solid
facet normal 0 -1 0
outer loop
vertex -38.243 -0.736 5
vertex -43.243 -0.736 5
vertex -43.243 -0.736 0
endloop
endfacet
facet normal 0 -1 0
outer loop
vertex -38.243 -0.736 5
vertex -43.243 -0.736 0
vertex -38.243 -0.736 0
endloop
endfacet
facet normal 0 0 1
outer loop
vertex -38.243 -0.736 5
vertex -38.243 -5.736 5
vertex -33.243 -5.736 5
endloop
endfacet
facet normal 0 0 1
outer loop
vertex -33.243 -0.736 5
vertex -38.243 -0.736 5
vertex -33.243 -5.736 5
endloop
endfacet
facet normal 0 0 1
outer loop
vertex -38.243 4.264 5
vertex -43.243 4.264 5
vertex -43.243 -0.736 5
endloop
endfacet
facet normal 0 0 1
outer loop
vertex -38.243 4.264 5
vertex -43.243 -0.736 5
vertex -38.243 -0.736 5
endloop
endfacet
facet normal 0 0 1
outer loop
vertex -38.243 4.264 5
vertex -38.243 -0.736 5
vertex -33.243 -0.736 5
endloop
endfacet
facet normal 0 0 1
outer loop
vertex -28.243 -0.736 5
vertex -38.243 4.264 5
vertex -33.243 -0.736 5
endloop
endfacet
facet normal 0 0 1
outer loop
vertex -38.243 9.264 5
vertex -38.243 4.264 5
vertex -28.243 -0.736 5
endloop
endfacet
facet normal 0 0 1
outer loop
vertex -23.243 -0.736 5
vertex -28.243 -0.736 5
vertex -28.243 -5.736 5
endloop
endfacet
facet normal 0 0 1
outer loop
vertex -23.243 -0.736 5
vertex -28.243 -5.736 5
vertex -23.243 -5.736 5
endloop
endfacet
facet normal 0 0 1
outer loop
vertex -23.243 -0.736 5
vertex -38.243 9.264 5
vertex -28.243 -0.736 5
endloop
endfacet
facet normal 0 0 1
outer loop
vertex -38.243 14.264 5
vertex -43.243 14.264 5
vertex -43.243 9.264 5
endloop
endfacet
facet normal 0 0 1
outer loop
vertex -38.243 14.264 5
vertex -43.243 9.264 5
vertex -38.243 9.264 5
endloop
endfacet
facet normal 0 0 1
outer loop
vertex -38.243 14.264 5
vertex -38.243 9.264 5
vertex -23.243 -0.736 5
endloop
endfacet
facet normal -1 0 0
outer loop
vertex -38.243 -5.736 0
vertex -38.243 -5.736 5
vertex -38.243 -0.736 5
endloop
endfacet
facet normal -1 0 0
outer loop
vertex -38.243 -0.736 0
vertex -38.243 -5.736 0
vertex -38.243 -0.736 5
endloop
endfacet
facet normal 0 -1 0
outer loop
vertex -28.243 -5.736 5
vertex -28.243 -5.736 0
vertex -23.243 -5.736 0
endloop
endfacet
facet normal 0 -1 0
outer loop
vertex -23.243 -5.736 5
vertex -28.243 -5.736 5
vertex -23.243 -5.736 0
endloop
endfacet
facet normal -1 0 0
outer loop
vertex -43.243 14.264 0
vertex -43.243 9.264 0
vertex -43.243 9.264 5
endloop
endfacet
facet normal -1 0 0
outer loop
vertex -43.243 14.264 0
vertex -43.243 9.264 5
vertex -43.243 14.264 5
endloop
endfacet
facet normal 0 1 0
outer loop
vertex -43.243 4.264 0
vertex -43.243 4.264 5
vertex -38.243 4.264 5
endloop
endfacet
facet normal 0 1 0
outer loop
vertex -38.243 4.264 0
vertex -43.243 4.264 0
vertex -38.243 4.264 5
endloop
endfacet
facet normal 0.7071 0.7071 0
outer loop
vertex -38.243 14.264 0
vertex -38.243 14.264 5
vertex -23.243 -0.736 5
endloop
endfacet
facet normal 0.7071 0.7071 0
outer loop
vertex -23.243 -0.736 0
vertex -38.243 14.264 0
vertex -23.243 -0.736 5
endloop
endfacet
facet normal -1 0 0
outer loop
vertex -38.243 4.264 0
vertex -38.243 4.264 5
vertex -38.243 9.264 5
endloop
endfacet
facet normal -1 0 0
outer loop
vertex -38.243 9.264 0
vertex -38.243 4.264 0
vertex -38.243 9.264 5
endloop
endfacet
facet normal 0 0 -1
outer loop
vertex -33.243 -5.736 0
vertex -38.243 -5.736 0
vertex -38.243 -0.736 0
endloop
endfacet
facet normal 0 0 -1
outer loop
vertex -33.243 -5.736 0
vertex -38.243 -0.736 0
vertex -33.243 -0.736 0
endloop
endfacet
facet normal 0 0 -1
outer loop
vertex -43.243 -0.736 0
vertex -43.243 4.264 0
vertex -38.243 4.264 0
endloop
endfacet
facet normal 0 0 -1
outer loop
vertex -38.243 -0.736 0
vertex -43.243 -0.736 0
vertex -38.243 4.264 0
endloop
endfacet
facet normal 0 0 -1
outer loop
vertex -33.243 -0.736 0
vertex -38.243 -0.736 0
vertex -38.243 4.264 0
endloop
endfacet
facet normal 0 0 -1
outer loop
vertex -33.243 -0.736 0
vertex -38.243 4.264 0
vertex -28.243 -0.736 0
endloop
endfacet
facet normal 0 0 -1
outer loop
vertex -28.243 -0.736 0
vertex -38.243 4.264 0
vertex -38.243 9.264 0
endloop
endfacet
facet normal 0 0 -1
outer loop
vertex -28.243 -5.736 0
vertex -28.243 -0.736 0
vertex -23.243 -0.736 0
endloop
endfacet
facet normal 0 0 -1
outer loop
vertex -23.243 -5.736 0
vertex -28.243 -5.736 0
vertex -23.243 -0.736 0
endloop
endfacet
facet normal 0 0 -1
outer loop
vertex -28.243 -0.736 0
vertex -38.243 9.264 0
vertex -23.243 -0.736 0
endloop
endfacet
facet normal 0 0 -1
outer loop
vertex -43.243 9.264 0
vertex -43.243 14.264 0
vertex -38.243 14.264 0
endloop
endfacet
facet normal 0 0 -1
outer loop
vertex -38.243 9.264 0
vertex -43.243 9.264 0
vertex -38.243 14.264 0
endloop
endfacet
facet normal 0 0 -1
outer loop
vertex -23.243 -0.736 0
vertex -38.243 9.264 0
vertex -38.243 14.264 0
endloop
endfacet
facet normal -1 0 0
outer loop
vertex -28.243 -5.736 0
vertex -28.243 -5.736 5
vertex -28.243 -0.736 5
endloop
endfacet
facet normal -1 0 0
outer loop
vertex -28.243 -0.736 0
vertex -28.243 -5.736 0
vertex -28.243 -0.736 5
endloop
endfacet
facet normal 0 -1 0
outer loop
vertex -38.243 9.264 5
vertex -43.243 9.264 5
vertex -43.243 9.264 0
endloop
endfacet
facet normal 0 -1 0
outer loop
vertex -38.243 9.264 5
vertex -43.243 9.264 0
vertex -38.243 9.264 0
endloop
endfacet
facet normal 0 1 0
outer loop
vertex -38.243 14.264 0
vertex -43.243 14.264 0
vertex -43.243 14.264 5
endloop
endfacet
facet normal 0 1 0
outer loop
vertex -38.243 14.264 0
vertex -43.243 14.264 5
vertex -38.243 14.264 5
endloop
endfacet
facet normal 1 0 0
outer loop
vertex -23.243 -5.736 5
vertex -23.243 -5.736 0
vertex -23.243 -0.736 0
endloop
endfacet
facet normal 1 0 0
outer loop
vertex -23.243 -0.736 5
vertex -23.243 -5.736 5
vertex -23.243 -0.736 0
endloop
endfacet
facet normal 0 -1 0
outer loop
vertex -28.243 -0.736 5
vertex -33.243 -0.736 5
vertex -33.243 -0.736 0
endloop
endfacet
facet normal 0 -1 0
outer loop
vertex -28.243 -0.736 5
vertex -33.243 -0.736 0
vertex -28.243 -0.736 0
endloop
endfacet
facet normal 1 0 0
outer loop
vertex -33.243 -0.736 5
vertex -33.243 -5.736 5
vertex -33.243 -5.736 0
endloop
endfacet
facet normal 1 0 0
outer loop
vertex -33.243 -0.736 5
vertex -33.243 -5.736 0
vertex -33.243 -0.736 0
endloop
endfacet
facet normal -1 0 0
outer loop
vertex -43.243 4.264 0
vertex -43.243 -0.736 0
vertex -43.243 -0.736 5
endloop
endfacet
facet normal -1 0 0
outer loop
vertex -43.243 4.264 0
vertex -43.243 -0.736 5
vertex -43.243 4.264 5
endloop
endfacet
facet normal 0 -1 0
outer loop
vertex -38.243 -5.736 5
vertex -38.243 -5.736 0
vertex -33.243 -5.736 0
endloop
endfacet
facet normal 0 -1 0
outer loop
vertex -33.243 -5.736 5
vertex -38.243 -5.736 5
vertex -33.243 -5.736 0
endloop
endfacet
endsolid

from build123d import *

# Parameters (mm, degrees)
ESQUISSE1_W             = 20
ESQUISSE1_H             = 20
BOSS_EXTRU_1_DEPTH      = 5
ESQUISSE2_W             = 5
ESQUISSE2_H             = 5
ENL_V_MAT_EXTRU_1_DEPTH = 5


with BuildPart() as part:
    # Esquisse1 → Boss.-Extru.1 (new body)
    with BuildSketch(Plane.XY):
        with Locations((-33.243041797, 4.26352657)):
            Rectangle(ESQUISSE1_W, ESQUISSE1_H)
    extrude(amount=BOSS_EXTRU_1_DEPTH)

    # Esquisse2 → Enlèv. mat.-Extru.1 (cut)
    with BuildSketch(Plane.XY.offset(5)):
        with Locations((-30.743041797, -3.23647343)):
            Rectangle(ESQUISSE2_W, ESQUISSE2_H)
        with Locations((-40.743041797, -3.23647343)):
            Rectangle(ESQUISSE2_W, ESQUISSE2_H)
        with Locations((-40.743041797, 6.76352657)):
            Rectangle(ESQUISSE2_W, ESQUISSE2_H)
        Polygon((-23.243041797, 14.26352657), (-38.243041797, 14.26352657), (-23.243041797, -0.73647343), align=None)
    extrude(amount=-ENL_V_MAT_EXTRU_1_DEPTH, mode=Mode.SUBTRACT)


solid = part.part
